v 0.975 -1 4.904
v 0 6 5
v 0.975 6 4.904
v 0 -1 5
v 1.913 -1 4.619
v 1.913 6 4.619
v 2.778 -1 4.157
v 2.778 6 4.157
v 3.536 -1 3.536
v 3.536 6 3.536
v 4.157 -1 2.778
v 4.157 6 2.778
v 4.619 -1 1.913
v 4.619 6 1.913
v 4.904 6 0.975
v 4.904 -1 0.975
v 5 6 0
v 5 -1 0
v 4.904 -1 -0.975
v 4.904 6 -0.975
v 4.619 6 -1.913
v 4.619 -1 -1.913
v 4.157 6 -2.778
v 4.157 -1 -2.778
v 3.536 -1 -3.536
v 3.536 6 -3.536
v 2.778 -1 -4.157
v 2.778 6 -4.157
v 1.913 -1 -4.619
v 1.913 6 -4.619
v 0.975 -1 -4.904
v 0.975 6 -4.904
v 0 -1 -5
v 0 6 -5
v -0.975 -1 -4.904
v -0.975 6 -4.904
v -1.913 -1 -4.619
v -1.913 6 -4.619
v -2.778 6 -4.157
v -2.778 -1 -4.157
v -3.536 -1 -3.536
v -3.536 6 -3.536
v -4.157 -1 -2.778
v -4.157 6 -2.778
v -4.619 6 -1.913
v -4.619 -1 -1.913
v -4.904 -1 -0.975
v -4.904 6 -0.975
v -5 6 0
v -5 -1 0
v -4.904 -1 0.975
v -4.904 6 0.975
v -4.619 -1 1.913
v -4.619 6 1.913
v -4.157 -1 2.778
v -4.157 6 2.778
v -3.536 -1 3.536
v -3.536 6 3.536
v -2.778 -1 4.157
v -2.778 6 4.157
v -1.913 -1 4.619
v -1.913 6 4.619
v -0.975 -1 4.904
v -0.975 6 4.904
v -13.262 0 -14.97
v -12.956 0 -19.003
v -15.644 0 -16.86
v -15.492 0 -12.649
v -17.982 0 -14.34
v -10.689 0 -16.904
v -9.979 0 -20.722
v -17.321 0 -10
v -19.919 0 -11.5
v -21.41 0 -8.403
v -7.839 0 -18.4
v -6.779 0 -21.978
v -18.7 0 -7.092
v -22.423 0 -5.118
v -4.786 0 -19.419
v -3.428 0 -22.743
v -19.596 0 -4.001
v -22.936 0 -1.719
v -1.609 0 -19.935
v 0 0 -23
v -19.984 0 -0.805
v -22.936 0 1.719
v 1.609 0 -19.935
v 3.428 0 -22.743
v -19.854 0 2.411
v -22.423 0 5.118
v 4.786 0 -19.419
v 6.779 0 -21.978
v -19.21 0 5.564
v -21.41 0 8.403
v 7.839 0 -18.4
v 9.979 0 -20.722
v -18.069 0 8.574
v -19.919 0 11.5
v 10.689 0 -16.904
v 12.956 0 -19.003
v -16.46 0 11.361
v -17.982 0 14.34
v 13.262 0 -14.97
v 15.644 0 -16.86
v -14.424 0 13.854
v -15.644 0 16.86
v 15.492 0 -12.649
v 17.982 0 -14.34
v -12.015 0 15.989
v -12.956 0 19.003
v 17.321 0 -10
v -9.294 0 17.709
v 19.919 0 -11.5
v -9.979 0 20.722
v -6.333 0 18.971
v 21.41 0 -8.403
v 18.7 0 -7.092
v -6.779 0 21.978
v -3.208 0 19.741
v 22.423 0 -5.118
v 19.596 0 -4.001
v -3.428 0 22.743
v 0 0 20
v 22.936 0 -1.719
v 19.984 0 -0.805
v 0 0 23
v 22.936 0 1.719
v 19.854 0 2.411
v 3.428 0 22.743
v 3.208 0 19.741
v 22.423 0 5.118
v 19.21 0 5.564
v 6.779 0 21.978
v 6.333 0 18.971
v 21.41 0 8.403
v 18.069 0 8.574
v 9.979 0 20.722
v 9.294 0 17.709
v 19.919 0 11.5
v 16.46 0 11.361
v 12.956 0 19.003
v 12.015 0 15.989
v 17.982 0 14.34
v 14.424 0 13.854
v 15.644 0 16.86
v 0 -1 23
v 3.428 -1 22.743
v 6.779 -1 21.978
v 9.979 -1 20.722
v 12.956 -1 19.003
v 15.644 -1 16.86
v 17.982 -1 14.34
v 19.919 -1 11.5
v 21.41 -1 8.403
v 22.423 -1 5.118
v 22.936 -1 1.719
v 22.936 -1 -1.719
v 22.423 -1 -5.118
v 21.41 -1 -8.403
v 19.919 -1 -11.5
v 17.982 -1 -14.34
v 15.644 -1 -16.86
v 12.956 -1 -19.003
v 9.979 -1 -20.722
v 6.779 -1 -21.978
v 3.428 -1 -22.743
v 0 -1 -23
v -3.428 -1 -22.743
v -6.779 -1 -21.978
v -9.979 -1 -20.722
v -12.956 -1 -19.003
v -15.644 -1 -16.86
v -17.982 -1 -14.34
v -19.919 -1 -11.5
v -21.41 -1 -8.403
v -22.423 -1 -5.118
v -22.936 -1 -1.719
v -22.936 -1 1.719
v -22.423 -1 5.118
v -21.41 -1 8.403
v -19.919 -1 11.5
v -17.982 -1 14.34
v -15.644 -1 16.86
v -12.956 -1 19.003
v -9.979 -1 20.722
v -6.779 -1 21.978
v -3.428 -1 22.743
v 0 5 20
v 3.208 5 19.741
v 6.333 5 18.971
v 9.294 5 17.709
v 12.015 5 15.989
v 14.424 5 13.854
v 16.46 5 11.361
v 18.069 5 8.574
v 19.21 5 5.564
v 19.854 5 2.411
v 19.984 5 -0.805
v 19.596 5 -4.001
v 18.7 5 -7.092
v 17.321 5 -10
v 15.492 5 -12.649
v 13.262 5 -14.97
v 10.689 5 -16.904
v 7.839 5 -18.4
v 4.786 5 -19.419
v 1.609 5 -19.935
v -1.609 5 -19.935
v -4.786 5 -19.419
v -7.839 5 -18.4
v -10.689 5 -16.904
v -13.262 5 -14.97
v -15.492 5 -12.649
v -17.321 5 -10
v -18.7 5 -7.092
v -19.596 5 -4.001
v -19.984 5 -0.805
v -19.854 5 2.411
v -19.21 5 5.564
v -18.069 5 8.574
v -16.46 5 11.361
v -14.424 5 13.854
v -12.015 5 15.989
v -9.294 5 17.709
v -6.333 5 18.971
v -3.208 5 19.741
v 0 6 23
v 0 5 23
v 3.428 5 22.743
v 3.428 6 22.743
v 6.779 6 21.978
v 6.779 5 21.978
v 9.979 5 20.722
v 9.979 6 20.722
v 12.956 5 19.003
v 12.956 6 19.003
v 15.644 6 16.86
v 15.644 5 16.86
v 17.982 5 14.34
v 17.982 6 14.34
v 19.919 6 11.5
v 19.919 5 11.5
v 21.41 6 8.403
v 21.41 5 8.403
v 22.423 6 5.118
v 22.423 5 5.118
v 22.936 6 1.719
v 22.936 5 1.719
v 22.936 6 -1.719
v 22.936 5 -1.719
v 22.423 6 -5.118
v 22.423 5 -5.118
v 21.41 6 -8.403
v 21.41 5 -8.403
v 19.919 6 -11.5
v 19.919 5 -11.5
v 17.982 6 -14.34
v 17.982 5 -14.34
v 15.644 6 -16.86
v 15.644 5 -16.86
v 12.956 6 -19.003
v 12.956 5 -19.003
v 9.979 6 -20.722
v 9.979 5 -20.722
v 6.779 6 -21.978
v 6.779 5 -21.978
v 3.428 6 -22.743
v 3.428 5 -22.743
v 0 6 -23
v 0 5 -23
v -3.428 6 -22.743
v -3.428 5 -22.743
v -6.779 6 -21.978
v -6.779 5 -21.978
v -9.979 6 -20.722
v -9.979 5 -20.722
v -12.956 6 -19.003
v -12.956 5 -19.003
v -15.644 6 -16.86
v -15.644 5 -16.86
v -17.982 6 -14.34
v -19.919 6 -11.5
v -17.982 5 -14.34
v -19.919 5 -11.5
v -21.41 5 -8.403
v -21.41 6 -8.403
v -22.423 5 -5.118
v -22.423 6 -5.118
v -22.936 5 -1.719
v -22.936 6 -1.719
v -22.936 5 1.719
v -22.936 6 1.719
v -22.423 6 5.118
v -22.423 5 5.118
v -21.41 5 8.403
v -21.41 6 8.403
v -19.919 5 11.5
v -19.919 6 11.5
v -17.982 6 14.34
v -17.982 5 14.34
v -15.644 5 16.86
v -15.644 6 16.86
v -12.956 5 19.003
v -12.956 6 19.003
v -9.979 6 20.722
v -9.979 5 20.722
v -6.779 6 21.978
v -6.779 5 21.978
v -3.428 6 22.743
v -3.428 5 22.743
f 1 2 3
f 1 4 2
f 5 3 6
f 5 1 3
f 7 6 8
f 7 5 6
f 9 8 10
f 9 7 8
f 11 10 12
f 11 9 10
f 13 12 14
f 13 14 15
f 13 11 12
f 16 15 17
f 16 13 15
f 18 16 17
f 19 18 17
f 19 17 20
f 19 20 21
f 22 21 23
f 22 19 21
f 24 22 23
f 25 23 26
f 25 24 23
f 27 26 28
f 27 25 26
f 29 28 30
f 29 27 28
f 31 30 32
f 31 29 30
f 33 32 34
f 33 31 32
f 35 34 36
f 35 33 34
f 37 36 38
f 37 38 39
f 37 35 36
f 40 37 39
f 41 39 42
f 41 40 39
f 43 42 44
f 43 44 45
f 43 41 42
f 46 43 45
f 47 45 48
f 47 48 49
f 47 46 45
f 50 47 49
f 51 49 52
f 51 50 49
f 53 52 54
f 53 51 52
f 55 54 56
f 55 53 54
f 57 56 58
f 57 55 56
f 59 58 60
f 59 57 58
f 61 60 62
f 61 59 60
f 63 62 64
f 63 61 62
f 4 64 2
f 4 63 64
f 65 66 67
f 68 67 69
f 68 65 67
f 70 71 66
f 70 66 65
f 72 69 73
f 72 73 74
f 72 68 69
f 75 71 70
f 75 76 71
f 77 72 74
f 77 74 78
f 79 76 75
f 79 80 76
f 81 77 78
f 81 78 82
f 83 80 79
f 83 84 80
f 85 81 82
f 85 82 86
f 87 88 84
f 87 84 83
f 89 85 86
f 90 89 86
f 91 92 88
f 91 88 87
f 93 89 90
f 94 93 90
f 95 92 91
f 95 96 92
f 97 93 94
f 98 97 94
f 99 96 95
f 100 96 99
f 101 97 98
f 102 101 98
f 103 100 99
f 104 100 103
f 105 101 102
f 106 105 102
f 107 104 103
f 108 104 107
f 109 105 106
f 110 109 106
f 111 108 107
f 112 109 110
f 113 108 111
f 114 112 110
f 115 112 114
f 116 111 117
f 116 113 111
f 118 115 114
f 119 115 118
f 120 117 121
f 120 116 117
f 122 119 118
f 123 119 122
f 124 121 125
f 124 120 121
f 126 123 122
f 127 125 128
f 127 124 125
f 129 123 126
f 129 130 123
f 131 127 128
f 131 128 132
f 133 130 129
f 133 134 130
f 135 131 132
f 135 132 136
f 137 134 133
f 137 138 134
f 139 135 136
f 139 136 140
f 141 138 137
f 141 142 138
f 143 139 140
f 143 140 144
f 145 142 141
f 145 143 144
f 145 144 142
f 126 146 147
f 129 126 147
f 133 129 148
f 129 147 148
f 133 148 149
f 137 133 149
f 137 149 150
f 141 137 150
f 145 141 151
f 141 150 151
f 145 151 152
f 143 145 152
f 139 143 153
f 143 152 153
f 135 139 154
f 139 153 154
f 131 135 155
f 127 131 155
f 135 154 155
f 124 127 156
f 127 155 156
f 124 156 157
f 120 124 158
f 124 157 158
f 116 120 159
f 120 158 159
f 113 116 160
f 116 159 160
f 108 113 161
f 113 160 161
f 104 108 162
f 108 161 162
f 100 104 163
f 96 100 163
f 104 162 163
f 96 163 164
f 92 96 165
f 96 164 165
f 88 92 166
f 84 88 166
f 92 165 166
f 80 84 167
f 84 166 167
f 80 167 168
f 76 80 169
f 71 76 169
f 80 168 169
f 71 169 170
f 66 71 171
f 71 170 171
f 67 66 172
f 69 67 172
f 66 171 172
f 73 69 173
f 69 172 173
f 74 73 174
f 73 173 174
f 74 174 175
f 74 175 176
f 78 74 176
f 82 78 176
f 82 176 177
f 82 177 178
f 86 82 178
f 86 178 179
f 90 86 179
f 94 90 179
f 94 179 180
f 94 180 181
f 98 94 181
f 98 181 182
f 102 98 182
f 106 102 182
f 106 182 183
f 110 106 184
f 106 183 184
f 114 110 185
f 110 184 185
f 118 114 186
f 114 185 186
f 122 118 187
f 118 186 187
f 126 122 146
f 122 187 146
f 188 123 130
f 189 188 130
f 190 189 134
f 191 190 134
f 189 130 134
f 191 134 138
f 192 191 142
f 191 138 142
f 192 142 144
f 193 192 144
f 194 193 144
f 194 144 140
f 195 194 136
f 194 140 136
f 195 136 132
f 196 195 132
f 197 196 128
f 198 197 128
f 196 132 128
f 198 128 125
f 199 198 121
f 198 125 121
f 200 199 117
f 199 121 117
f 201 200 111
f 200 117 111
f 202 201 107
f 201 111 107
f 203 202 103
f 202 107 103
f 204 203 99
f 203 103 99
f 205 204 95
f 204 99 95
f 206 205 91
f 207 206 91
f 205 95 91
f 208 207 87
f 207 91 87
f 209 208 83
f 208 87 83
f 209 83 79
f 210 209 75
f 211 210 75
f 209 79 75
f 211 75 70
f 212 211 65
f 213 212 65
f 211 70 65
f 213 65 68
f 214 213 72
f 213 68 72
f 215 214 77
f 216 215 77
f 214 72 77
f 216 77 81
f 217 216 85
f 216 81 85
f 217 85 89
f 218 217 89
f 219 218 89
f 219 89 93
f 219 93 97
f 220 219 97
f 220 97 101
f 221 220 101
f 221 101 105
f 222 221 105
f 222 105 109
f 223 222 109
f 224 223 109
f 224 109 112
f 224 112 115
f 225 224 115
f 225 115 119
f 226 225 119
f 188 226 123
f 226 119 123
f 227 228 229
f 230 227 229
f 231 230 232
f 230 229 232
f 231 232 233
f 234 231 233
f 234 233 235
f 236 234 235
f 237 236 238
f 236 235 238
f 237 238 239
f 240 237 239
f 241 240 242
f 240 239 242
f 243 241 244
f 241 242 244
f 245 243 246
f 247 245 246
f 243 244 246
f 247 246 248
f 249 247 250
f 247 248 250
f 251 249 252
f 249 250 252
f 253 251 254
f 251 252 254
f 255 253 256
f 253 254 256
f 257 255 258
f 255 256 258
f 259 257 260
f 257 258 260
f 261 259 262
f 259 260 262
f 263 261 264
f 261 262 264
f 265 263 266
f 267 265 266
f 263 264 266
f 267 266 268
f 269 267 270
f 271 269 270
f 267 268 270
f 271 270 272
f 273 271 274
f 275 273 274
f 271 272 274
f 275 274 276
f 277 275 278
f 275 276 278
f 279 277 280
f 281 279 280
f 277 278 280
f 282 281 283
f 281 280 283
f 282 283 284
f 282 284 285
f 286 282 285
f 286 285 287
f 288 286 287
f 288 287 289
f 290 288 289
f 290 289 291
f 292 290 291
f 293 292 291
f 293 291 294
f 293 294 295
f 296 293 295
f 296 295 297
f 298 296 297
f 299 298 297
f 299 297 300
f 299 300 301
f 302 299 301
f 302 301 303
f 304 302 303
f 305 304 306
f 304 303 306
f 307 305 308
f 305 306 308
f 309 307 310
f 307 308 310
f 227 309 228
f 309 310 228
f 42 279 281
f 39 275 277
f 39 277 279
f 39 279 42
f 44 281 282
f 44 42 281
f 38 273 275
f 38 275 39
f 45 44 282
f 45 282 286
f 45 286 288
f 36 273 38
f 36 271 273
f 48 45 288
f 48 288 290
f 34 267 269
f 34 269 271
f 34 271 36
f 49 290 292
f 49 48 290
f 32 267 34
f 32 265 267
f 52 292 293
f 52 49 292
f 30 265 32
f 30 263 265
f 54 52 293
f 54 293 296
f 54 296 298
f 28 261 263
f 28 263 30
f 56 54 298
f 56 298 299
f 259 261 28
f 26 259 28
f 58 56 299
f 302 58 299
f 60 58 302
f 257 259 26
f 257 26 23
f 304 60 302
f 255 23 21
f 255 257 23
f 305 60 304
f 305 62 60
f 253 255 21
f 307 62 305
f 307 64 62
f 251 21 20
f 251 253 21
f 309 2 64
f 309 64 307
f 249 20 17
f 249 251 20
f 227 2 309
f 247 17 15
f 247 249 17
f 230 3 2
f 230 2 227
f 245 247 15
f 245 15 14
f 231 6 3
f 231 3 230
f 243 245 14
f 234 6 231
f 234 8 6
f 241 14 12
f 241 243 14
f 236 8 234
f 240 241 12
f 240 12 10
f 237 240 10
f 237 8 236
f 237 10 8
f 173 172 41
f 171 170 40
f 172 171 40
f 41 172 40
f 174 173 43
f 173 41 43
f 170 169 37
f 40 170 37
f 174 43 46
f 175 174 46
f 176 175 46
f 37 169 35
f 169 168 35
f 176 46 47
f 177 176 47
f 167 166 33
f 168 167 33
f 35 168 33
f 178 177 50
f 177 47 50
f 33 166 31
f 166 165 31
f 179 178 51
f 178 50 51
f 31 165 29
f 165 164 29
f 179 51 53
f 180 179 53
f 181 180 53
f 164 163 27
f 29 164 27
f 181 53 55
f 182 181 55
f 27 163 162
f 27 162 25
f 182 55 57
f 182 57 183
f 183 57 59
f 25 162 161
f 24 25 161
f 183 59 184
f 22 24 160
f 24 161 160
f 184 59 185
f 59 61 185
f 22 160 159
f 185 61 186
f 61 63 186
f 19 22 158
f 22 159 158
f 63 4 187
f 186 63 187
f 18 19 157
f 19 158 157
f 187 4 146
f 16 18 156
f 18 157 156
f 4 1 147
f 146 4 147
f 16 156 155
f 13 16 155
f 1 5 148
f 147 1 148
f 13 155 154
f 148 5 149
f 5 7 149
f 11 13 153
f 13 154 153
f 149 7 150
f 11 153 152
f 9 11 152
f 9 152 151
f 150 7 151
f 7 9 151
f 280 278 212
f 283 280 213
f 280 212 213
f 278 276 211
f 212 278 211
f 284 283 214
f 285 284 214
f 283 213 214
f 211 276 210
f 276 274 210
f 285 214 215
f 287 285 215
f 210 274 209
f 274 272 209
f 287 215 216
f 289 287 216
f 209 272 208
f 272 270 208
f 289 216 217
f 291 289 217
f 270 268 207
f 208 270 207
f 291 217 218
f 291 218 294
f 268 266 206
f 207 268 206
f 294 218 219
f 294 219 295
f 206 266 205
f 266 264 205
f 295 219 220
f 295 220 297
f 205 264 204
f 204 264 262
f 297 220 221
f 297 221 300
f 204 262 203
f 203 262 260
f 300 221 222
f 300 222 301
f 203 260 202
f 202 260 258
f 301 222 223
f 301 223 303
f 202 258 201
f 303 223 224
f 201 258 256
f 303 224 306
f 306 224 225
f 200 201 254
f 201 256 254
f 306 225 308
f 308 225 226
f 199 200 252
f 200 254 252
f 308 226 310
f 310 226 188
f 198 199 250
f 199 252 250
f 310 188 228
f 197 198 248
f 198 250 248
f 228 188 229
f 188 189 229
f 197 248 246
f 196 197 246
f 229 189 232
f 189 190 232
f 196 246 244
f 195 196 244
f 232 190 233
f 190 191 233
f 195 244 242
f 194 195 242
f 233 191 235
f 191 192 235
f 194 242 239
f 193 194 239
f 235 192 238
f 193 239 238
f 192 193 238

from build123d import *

# Parameters (mm, degrees)
SKETCH1_R           = 20
SKETCH1_R_2         = 5
BOSS_EXTRUDE1_DEPTH = 5
BOSS_EXTRUDE2_START = -1
SKETCH1_3_R         = 23
SKETCH1_3_R_2       = 20
SKETCH1_3_R_3       = 5
BOSS_EXTRUDE2_DEPTH = 1
BOSS_EXTRUDE3_START = 5
SKETCH1_4_R         = 23
SKETCH1_4_R_2       = 20
SKETCH1_4_R_3       = 5
BOSS_EXTRUDE3_DEPTH = 1


with BuildPart() as part:
    # Sketch1 → Boss-Extrude1 (new body)
    with BuildSketch(Plane(origin=(0, 0, 0), x_dir=(1, 0, 0), z_dir=(0, 1, 0))):
        with Locations(Location((0, 0, 0), (0, 0, 270))):
            Circle(SKETCH1_R)
        with Locations(Location((0, 0, 0), (0, 0, 270))):
            Circle(SKETCH1_R_2, mode=Mode.SUBTRACT)
    extrude(amount=BOSS_EXTRUDE1_DEPTH)

    # Sketch1<3> → Boss-Extrude2 (add)
    # profile 1 of 2: a face of its own
    with BuildSketch(Plane(origin=(0, 0, 0), x_dir=(1, 0, 0), z_dir=(0, 1, 0)).offset(BOSS_EXTRUDE2_START)):
        with Locations(Location((0, 0, 0), (0, 0, 270))):
            Circle(SKETCH1_3_R)
        with Locations(Location((0, 0, 0), (0, 0, 270))):
            Circle(SKETCH1_3_R_2, mode=Mode.SUBTRACT)
    # profile 2 of 2: a face of its own
    with BuildSketch(Plane(origin=(0, 0, 0), x_dir=(1, 0, 0), z_dir=(0, 1, 0)).offset(BOSS_EXTRUDE2_START)):
        with Locations(Location((0, 0, 0), (0, 0, 270))):
            Circle(SKETCH1_3_R_2)
        with Locations(Location((0, 0, 0), (0, 0, 270))):
            Circle(SKETCH1_3_R_3, mode=Mode.SUBTRACT)
    extrude(amount=BOSS_EXTRUDE2_DEPTH)

    # Sketch1<4> → Boss-Extrude3 (add)
    # profile 1 of 2: a face of its own
    with BuildSketch(Plane(origin=(0, 0, 0), x_dir=(1, 0, 0), z_dir=(0, 1, 0)).offset(BOSS_EXTRUDE3_START)):
        with Locations(Location((0, 0, 0), (0, 0, 270))):
            Circle(SKETCH1_4_R)
        with Locations(Location((0, 0, 0), (0, 0, 270))):
            Circle(SKETCH1_4_R_2, mode=Mode.SUBTRACT)
    # profile 2 of 2: a face of its own
    with BuildSketch(Plane(origin=(0, 0, 0), x_dir=(1, 0, 0), z_dir=(0, 1, 0)).offset(BOSS_EXTRUDE3_START)):
        with Locations(Location((0, 0, 0), (0, 0, 270))):
            Circle(SKETCH1_4_R_2)
        with Locations(Location((0, 0, 0), (0, 0, 270))):
            Circle(SKETCH1_4_R_3, mode=Mode.SUBTRACT)
    extrude(amount=BOSS_EXTRUDE3_DEPTH)


solid = part.part
